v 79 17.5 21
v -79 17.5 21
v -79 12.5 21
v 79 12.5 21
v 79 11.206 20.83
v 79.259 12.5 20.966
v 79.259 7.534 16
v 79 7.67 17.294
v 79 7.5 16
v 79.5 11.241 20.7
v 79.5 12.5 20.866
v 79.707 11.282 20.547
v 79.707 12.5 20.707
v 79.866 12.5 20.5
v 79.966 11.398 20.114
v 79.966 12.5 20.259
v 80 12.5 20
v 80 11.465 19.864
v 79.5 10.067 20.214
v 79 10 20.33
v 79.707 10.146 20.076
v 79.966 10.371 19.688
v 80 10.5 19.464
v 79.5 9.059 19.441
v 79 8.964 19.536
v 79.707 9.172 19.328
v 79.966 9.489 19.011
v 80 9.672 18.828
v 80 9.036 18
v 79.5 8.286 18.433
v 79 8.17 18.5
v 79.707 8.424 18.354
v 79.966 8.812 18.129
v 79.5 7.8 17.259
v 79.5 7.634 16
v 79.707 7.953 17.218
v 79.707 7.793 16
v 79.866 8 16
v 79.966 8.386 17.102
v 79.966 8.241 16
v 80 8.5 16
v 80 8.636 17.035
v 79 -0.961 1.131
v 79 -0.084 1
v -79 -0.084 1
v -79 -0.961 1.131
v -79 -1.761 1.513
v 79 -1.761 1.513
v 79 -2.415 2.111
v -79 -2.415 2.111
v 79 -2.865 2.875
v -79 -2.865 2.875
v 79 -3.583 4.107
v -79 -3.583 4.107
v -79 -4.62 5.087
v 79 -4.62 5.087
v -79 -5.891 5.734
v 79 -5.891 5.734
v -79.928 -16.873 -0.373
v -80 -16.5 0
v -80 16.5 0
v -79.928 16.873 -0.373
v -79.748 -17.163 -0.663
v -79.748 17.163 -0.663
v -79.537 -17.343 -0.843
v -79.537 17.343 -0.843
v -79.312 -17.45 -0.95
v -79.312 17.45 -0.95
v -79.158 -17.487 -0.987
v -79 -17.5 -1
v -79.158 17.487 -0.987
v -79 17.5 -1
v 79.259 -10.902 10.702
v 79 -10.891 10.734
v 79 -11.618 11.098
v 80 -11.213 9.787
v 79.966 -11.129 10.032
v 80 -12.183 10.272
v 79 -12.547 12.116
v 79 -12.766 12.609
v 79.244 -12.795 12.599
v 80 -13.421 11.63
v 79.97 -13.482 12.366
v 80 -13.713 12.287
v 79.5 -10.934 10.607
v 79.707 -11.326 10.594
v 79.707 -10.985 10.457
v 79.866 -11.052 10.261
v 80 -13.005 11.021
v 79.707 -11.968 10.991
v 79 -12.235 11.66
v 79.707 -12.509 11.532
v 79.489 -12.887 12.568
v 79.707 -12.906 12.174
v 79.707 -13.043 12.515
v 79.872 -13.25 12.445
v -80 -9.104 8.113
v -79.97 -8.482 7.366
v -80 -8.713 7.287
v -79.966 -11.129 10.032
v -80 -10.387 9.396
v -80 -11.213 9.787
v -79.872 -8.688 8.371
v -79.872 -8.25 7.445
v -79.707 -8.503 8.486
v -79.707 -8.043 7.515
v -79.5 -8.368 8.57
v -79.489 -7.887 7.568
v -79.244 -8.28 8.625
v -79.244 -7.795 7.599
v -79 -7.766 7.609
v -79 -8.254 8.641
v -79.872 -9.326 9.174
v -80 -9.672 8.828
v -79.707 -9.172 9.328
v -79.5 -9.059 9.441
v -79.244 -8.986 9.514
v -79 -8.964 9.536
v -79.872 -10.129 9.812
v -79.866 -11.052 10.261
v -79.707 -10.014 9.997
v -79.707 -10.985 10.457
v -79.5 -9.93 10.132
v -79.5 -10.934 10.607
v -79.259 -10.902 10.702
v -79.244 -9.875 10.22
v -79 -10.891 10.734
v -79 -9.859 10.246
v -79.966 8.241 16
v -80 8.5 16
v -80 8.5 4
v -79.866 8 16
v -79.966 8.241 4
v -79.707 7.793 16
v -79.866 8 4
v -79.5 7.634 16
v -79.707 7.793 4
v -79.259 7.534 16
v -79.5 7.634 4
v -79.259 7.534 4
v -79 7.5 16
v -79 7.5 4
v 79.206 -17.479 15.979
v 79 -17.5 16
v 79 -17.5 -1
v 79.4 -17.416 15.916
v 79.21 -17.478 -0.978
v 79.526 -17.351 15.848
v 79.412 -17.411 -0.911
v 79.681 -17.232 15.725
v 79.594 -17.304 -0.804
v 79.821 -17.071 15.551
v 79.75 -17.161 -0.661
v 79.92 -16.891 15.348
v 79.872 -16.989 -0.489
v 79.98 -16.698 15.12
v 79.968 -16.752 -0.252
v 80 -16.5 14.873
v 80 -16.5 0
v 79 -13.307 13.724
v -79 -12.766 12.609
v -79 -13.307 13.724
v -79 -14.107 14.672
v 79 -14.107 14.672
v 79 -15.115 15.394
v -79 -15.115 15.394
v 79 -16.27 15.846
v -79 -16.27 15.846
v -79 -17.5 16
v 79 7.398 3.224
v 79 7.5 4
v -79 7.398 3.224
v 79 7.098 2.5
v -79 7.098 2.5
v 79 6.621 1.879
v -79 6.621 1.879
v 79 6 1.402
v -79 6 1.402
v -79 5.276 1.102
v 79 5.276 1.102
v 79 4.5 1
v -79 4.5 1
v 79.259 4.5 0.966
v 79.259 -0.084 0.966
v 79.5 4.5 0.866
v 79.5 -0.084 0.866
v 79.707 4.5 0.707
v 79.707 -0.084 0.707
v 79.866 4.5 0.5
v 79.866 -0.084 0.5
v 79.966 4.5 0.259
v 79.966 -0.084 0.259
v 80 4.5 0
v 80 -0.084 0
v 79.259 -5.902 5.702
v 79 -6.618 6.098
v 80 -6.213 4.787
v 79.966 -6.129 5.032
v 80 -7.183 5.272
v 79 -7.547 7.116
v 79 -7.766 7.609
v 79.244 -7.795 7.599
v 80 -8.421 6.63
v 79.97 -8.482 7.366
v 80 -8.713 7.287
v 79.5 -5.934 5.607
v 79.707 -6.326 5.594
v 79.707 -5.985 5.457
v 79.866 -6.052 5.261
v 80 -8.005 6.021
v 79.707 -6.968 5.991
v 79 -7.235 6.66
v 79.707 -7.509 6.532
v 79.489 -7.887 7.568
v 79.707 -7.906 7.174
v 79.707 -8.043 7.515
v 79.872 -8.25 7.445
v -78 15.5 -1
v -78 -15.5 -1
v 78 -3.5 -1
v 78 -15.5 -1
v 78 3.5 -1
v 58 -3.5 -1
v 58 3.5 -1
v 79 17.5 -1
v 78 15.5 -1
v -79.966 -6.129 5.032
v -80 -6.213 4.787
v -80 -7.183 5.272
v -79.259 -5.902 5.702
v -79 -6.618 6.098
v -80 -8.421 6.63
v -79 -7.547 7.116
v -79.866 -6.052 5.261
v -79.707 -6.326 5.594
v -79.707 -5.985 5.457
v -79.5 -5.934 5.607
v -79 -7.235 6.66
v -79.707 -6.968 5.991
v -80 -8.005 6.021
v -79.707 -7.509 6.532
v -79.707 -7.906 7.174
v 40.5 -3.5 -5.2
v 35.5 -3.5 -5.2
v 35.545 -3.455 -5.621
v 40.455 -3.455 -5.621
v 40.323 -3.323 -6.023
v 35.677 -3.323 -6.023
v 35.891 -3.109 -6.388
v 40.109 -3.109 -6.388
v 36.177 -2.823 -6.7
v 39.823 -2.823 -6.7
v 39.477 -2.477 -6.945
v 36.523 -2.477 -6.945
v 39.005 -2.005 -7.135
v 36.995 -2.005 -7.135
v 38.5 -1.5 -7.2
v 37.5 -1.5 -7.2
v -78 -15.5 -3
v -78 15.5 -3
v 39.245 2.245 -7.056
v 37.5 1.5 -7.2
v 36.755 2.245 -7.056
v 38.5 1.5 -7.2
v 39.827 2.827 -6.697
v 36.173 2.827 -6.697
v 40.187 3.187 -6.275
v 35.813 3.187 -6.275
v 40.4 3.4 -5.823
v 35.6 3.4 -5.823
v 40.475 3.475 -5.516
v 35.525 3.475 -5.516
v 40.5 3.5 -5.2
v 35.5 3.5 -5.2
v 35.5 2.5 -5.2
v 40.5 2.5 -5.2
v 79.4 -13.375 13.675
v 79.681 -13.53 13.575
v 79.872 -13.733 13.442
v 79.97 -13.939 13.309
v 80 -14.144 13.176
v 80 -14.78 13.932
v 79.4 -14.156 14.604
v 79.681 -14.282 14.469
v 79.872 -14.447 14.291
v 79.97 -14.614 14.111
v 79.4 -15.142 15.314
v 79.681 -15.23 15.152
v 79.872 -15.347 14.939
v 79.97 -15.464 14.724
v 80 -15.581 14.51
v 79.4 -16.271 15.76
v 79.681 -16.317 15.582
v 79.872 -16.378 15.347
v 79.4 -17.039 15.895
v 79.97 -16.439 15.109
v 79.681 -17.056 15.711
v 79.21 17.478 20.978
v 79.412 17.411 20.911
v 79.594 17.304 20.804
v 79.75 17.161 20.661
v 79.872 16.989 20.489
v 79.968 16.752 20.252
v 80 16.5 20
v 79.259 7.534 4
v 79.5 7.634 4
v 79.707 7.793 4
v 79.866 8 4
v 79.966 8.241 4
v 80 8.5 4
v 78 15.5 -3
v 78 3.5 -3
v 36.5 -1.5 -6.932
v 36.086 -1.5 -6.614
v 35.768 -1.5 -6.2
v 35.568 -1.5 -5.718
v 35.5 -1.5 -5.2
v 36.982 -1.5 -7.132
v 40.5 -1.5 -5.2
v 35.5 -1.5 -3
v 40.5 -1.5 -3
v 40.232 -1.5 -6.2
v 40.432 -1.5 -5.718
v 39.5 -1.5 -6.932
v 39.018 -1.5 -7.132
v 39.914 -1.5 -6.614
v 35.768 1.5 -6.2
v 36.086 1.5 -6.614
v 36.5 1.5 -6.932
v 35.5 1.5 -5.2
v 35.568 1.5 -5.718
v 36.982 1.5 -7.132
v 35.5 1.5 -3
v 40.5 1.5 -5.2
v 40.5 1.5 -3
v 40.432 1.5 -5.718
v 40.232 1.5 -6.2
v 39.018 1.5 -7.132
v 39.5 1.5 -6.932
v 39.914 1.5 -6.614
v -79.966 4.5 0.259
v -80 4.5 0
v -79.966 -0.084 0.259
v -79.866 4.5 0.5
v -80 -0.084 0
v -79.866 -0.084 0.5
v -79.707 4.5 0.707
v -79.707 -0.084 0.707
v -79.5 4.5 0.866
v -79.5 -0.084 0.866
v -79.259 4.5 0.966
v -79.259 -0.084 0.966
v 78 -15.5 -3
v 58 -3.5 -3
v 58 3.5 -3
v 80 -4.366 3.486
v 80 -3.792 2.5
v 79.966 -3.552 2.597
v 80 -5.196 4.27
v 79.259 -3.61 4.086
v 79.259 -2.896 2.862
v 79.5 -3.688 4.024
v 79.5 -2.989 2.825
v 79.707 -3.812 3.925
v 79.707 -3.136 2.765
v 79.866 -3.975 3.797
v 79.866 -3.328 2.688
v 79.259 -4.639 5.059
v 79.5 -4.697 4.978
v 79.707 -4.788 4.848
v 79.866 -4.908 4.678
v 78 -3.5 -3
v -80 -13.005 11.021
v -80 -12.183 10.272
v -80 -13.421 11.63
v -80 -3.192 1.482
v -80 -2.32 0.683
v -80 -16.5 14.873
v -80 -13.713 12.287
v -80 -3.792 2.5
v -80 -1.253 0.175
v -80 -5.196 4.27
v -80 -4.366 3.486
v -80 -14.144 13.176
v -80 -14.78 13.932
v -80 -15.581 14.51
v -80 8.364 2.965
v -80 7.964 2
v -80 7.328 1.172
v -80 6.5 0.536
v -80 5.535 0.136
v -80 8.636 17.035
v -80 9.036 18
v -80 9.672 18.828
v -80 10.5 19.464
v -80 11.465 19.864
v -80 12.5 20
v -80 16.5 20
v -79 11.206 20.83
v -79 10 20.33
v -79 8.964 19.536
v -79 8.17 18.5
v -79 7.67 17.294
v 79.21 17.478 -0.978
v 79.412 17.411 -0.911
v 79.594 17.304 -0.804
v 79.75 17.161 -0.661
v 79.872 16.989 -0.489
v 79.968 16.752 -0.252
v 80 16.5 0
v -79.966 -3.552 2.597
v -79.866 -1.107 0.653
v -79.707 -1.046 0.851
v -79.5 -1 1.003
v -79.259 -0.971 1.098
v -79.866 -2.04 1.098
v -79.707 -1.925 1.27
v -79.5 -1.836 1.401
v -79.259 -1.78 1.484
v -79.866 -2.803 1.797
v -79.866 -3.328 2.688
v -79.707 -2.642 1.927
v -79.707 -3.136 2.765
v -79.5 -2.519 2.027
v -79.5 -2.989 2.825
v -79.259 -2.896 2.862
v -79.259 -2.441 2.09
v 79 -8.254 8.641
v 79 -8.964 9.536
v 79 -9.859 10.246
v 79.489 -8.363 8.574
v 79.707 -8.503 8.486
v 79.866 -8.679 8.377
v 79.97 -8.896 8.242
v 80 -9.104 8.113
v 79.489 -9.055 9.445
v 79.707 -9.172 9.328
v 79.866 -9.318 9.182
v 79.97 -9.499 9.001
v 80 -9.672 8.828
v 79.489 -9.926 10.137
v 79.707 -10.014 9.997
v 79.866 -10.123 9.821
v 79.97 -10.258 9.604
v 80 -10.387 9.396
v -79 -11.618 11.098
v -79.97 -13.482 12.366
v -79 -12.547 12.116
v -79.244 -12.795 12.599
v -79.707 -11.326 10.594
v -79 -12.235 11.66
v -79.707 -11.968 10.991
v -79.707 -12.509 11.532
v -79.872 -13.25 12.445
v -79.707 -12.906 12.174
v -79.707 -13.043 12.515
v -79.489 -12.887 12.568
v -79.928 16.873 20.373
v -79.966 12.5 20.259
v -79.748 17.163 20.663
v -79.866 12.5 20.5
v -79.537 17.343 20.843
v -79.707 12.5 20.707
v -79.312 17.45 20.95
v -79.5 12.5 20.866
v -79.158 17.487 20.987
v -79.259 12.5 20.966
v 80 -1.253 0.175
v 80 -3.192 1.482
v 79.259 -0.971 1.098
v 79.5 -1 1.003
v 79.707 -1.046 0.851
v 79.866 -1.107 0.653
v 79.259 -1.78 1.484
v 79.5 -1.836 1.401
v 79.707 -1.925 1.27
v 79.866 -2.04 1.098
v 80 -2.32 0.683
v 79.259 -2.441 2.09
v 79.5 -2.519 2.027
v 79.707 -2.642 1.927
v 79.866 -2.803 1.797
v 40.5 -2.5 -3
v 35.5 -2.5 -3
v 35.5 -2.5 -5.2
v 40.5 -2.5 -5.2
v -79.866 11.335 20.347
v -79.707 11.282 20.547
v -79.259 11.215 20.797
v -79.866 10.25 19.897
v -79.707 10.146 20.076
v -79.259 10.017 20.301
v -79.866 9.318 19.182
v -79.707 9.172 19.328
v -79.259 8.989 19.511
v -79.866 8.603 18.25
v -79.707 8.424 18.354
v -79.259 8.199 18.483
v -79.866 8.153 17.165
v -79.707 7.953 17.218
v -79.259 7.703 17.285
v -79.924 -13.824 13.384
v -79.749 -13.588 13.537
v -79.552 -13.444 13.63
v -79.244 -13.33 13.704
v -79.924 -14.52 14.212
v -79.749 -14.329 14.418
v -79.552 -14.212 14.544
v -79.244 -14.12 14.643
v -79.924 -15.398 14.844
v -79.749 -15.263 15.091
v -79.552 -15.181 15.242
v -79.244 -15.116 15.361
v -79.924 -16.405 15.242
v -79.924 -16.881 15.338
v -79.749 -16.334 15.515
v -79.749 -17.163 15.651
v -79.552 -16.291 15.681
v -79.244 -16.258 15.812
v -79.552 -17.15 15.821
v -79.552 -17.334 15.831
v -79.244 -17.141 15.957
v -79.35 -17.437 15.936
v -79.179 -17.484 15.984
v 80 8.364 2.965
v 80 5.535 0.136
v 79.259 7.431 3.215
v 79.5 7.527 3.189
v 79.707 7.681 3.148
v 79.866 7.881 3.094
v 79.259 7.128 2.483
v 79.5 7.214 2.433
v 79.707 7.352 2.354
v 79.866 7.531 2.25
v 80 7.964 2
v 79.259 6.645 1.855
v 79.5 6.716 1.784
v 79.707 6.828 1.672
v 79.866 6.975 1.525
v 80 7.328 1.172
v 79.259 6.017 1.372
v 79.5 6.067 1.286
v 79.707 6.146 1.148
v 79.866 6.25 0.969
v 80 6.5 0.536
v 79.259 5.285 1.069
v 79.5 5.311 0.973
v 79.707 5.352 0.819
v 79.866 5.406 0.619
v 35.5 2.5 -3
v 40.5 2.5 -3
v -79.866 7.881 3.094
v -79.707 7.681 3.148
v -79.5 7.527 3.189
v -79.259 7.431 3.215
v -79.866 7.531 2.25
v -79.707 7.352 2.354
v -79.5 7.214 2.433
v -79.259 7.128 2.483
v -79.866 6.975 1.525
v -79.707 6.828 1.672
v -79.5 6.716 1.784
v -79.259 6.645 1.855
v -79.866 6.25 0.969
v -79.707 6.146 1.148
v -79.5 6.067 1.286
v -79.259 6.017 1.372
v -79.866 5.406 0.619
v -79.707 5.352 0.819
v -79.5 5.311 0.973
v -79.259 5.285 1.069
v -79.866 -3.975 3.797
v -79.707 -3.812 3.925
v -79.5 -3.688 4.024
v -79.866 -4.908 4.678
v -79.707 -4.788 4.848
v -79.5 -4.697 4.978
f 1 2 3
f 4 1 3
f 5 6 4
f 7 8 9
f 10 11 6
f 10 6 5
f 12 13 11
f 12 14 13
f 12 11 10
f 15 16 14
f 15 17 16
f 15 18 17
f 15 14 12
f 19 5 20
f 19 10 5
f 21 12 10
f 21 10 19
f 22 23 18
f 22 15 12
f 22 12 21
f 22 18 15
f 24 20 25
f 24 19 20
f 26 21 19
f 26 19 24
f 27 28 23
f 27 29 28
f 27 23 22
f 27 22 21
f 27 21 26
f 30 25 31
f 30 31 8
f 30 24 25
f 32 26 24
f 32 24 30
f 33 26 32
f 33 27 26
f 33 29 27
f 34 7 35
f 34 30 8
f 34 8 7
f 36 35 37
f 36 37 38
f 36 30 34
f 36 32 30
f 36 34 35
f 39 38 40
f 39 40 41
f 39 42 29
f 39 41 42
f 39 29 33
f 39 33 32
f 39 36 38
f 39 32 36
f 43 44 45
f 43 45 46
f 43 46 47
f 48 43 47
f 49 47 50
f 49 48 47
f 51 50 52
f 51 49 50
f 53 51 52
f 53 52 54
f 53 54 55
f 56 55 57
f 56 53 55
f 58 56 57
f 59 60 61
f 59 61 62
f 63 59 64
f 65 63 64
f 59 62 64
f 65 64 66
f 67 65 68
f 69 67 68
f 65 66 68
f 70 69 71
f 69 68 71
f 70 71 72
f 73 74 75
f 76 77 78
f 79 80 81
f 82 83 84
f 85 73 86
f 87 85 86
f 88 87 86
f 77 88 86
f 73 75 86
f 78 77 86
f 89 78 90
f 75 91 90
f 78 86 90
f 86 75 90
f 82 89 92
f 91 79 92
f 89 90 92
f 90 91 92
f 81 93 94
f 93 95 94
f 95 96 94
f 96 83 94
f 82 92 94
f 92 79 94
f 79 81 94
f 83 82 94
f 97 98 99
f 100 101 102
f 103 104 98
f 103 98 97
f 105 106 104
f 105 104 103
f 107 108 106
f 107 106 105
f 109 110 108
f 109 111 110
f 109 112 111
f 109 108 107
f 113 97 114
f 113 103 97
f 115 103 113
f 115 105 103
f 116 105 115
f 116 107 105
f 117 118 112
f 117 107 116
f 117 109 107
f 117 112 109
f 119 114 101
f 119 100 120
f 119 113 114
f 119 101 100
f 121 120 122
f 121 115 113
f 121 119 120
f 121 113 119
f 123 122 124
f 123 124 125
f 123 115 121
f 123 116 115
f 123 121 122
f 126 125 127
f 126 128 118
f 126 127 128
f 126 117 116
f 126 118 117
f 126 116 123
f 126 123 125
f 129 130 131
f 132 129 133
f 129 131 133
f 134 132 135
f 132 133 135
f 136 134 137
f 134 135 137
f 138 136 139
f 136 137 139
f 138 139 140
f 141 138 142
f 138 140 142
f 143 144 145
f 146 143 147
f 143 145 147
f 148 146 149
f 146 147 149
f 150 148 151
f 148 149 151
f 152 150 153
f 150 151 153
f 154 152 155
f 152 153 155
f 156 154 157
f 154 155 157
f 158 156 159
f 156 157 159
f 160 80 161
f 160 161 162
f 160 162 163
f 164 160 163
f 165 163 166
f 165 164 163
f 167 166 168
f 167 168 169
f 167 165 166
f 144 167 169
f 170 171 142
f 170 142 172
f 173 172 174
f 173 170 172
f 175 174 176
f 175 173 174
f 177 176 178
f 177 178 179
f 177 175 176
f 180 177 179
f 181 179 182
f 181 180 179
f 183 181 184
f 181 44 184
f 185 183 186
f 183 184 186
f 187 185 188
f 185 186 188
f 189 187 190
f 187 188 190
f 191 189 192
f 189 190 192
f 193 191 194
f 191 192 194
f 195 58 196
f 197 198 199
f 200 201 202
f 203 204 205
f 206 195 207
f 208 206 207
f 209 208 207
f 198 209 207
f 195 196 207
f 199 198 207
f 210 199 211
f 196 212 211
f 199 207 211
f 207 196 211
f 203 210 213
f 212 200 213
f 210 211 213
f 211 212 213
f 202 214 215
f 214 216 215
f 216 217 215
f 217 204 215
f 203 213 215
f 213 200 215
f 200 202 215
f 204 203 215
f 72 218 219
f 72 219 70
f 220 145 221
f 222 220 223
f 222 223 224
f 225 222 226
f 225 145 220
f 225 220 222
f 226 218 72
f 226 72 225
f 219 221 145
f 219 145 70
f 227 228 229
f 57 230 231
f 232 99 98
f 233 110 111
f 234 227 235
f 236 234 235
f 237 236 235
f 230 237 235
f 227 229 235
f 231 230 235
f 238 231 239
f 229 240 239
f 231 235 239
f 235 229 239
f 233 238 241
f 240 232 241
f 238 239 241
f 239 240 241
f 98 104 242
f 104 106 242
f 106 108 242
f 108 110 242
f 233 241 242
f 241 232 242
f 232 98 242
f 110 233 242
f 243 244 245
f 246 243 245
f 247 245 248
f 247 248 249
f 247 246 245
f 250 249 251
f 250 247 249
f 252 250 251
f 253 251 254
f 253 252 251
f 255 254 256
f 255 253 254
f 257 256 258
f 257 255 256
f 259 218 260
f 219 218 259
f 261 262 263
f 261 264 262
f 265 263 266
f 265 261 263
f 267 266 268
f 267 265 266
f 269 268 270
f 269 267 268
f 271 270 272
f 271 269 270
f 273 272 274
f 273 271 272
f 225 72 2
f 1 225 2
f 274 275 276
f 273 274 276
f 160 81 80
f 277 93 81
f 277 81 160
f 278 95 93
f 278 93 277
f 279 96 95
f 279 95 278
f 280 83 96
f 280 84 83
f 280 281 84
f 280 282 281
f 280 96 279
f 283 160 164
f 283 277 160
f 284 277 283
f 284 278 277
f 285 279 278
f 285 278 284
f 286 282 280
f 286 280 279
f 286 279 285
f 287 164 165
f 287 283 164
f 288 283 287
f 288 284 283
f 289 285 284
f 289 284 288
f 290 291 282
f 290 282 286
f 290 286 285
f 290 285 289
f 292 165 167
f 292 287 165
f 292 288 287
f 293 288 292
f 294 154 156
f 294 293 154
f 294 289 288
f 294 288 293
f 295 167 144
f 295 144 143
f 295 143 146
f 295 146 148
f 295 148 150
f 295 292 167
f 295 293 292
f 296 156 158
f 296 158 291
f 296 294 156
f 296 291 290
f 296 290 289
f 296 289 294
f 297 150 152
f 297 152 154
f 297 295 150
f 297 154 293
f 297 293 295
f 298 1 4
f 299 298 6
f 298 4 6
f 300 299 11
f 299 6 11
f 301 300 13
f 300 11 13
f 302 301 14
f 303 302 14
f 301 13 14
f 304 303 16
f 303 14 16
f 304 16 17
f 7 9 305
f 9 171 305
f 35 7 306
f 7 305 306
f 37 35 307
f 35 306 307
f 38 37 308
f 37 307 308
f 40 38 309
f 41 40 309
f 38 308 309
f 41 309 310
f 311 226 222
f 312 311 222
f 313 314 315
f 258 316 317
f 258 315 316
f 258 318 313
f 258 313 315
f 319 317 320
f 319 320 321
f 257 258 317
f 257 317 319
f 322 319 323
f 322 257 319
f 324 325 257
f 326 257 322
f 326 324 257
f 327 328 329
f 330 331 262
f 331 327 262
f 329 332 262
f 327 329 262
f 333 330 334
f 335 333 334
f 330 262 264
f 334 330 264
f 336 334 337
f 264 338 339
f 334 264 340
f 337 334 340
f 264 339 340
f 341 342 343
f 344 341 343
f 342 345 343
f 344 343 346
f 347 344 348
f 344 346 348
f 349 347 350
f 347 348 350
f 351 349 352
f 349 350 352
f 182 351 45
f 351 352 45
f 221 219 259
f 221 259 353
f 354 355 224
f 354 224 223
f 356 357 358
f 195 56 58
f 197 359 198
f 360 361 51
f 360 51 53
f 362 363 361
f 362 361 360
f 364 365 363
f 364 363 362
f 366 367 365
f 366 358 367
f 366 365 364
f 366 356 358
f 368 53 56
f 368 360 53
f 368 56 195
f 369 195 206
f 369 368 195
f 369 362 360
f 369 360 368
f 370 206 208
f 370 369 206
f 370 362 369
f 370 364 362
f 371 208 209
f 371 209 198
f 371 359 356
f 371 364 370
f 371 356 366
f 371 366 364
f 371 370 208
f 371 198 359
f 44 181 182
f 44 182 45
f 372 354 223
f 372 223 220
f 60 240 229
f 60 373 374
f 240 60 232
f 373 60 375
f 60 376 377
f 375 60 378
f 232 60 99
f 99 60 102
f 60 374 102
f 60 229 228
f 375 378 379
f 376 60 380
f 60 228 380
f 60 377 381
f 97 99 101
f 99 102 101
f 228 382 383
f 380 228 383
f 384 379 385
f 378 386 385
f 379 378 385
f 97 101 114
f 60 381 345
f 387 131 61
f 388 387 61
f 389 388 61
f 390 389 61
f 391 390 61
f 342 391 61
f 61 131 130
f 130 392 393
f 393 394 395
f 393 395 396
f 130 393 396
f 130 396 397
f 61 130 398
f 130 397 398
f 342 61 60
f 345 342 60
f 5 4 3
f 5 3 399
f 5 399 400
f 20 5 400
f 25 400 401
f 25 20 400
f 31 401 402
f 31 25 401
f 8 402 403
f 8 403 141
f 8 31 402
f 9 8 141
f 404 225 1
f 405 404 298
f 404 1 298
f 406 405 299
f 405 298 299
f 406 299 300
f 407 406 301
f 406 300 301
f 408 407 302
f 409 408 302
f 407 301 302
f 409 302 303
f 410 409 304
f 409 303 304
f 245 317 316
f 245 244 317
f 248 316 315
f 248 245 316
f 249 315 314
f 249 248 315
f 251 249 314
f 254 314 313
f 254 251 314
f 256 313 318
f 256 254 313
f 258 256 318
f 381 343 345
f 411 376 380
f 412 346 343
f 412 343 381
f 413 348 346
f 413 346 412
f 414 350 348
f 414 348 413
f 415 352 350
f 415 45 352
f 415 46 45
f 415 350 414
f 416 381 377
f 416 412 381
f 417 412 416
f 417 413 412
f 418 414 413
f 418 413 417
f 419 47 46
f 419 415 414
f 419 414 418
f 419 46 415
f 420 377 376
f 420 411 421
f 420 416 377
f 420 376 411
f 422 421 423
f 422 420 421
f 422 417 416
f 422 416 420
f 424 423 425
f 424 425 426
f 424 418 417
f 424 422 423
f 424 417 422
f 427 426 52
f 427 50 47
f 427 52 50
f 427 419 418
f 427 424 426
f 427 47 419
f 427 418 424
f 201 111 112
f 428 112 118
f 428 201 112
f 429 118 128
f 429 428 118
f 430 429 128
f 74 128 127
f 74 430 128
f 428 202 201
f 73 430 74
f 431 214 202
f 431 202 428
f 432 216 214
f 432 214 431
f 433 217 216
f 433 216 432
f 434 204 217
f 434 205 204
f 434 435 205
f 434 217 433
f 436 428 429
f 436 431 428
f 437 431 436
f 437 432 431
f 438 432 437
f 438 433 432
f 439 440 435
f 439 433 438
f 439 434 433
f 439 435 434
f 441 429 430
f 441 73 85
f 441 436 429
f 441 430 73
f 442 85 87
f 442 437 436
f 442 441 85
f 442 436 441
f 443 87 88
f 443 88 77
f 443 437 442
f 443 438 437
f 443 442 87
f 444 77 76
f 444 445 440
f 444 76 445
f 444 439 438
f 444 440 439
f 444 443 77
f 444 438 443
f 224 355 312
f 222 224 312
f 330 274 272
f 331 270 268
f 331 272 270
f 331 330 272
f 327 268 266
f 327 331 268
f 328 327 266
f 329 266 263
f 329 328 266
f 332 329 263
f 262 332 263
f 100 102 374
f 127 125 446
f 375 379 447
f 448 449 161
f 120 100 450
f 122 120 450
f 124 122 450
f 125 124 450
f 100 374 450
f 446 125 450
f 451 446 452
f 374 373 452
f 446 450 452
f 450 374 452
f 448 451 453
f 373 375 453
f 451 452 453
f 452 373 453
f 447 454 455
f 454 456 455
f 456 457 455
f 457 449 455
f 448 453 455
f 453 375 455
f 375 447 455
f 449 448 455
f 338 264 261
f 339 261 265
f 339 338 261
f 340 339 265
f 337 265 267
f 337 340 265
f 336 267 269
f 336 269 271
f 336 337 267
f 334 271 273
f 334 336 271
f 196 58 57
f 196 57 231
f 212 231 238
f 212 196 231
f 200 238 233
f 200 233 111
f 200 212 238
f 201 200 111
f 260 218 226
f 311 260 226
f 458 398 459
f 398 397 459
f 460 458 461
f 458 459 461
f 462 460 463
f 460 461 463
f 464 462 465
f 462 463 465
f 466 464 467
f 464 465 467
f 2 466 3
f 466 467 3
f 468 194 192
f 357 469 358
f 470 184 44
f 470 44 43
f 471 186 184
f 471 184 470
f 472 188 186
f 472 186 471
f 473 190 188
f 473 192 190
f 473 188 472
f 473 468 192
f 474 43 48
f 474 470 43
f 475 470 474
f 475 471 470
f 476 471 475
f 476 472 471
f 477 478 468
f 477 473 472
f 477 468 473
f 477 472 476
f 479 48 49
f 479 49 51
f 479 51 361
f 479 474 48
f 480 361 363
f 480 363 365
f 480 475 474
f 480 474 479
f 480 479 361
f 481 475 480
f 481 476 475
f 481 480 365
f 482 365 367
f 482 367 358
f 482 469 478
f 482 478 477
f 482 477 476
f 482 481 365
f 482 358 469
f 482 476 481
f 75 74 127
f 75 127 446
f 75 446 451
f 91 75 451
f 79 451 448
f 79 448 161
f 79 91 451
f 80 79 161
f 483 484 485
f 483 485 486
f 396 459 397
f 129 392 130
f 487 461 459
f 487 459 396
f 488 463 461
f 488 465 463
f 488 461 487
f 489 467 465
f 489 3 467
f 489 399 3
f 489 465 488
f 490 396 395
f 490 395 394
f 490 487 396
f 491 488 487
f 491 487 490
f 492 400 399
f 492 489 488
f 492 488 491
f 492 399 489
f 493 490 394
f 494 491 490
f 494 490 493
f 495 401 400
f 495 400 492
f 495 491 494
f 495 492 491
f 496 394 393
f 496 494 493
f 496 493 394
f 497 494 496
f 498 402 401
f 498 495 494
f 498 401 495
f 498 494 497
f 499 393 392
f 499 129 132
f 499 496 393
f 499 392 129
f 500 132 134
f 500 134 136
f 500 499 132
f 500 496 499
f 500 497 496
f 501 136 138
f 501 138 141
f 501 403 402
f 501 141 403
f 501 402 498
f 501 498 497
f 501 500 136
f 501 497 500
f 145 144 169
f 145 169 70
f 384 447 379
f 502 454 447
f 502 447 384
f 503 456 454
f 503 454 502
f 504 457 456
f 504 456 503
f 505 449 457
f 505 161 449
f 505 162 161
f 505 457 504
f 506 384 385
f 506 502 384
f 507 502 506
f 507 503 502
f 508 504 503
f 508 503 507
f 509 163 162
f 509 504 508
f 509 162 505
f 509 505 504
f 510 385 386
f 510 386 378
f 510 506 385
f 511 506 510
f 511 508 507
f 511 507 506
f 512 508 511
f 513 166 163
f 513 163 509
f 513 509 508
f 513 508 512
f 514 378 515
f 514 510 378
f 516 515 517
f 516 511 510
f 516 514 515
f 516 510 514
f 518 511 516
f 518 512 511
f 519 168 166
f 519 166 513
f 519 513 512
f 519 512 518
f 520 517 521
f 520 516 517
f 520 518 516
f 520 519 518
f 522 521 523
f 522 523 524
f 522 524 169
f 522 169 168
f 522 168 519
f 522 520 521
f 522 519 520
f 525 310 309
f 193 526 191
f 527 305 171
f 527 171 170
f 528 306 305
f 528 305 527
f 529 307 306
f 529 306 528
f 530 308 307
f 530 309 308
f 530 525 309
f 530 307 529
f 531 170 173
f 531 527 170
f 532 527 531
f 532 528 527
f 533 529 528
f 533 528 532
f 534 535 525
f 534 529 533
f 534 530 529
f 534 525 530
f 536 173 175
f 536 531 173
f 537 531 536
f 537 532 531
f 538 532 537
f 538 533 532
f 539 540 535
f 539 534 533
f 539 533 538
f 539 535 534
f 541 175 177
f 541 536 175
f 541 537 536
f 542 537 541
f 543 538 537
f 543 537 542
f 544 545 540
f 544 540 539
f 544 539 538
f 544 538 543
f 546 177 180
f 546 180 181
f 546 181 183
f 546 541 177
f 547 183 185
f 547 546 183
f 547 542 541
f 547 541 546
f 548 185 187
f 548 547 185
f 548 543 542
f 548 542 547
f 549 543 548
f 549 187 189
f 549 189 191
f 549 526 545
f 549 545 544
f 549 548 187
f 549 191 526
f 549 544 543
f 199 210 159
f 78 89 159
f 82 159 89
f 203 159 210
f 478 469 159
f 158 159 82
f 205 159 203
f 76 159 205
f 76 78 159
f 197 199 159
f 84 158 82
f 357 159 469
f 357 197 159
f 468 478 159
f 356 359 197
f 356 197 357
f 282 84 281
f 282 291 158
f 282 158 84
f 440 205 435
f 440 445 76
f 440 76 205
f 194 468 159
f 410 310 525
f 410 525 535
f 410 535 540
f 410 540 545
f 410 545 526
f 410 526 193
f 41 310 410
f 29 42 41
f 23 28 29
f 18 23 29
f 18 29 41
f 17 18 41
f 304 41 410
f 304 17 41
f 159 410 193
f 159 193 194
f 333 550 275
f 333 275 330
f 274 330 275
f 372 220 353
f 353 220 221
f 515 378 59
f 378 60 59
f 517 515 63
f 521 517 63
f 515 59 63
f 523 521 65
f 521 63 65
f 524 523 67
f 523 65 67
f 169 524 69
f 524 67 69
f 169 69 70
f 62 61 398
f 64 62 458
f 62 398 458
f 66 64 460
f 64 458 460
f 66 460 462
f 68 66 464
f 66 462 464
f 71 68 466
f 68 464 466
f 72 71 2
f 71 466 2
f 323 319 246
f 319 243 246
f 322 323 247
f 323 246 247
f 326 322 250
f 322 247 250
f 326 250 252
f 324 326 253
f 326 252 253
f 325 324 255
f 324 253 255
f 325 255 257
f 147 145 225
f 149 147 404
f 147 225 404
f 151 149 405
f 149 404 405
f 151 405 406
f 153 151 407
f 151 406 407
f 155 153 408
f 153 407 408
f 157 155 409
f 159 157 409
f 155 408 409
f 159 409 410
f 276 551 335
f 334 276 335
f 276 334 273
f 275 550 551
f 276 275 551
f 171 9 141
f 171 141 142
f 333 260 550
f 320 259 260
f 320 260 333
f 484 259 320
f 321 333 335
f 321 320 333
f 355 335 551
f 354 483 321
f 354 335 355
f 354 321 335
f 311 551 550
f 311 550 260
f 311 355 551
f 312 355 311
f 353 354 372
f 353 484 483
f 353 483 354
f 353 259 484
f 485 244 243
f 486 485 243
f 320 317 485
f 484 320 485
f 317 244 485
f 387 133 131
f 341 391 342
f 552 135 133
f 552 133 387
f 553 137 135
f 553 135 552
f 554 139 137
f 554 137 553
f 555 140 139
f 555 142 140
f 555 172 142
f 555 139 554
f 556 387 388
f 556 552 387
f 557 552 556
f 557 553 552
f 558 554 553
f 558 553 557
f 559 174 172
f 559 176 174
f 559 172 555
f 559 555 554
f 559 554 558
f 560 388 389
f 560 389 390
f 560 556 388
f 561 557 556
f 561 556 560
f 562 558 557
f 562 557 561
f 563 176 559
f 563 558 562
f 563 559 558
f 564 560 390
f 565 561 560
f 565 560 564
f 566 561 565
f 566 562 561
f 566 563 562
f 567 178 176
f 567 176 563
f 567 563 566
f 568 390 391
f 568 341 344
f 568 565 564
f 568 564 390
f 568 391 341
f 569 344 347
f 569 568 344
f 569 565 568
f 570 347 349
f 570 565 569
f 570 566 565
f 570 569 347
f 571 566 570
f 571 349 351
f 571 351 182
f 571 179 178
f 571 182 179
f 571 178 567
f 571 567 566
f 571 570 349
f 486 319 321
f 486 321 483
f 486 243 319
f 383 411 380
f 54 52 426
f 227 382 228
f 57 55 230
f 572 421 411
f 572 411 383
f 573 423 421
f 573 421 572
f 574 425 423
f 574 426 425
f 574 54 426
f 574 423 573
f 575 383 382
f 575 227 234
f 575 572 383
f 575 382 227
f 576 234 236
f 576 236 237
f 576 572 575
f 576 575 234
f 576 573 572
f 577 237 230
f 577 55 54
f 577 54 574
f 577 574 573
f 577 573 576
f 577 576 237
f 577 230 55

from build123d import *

# Parameters (mm, degrees)
F1_DEPTH  = 80
F2_W      = 156
F2_H      = 31
F3_DEPTH  = 2
F4_W      = 5
F4_H      = 5
F5_DEPTH  = 2.2
F6_W      = 5
F6_H      = 7
F7_DEPTH  = 2
F8_W      = 5
F8_H      = 3
F9_DEPTH  = 4.2
F10_R     = 1.99999
F11_W     = 20
F11_H     = 7
F12_DEPTH = 2
F13_R     = 3
F14_R     = 0.99999


# Not quite as in the source:
# - a fillet or chamfer is up to 0.001 mm smaller than in the source, because OpenCascade refuses the exact size


with BuildPart() as f1:
    # F0 (on Right) → F1 (new body, symmetric)
    with BuildSketch(Plane.YZ):
        with BuildLine():
            Line((7.5, 1), (17.5, 1))
            Line((17.5, 1), (17.5, 21))
            Line((17.5, 21), (12.5, 21))
            ThreePointArc((12.5, 21), (8.9644660941, 19.5355339059), (7.5, 16))
            Line((7.5, 16), (7.5, 1))
        make_face()
        Polygon((17.5, -1), (17.5, 1), (7.5, 1), (-2.5, 1), (-7.5, 1), (-12.5, 1), (-17.5, 1), (-17.5, -1), align=None)
        with BuildLine():
            Line((-17.5, 16), (-17.5, 1))
            Line((-17.5, 1), (-12.5, 1))
            Line((-12.5, 1), (-12.5, 11))
            ThreePointArc((-12.5, 11), (-13.9644660941, 14.5355339059), (-17.5, 16))
        make_face()
        with BuildLine():
            Line((-12.5, 1), (-7.5, 1))
            Line((-7.5, 1), (-7.5, 6))
            ThreePointArc((-7.5, 6), (-8.9644660941, 9.5355339059), (-12.5, 11))
            Line((-12.5, 11), (-12.5, 1))
        make_face()
        with BuildLine():
            Line((-7.5, 1), (-2.5, 1))
            ThreePointArc((-2.5, 1), (-3.9644660941, 4.5355339059), (-7.5, 6))
            Line((-7.5, 6), (-7.5, 1))
        make_face()
    extrude(amount=F1_DEPTH, both=True)

    # F2 (on face) → F3 (join)
    with BuildSketch(Plane(origin=(0, 0, -1), x_dir=(1, 0, 0), z_dir=(0, 0, -1))):
        Rectangle(F2_W, F2_H)
    extrude(amount=F3_DEPTH)

    # F4 (on face) → F5 (join)
    with BuildSketch(Plane(origin=(0, 0, -3), x_dir=(1, 0, 0), z_dir=(0, 0, -1))):
        with Locations((38, 0)):
            Rectangle(F4_W, F4_H)
    extrude(amount=F5_DEPTH)

    # F6 (on face) → F7 (join)
    with BuildSketch(Plane(origin=(0, 0, -5.2), x_dir=(1, 0, 0), z_dir=(0, 0, -1))):
        with Locations((38, 0)):
            Rectangle(F6_W, F6_H)
    extrude(amount=F7_DEPTH)

    # F8 (on face) → F9 (cut)
    with BuildSketch(Plane(origin=(0, 0, -7.2), x_dir=(1, 0, 0), z_dir=(0, 0, -1))):
        with Locations((38, 0)):
            Rectangle(F8_W, F8_H)
    extrude(amount=-F9_DEPTH, mode=Mode.SUBTRACT)

    # F10 (radius 2 in the source; OpenCascade refuses exactly that, so slightly less here)
    f10_edges = [f1.edges().sort_by_distance(p)[0] for p in [
        (40.5, 2.5, -7.2),
        (38, 3.5, -7.2),
        (40.5, -2.5, -7.2),
        (38, -3.5, -7.2),
        (35.5, -2.5, -7.2),
        (35.5, 2.5, -7.2),
    ]]
    fillet(f10_edges, radius=F10_R)

    # F11 (on face) → F12 (cut)
    with BuildSketch(Plane(origin=(0, 0, -3), x_dir=(1, 0, 0), z_dir=(0, 0, -1))):
        with Locations((68, 0)):
            Rectangle(F11_W, F11_H)
    extrude(amount=-F12_DEPTH, mode=Mode.SUBTRACT)

    # F13
    f13_edges = [f1.edges().sort_by_distance(p)[0] for p in [
        (0, -12.5, 11),
        (0, -7.5, 6),
        (0, -2.5, 1),
        (0, 7.5, 1),
    ]]
    fillet(f13_edges, radius=F13_R)

    # F14 (radius 1 in the source; OpenCascade refuses exactly that, so slightly less here)
    f14_edges = [f1.edges().sort_by_distance(p)[0] for p in [
        (80, 7.5, 10),
        (80, 6.62132, 1.87868),
        (80, 8.964466, 19.535534),
        (80, 2.208099, 1),
        (80, 15, 21),
        (80, -1.760852, 1.512531),
        (80, 17.5, 10),
        (80, -4.066216, 4.634436),
        (80, 0, -1),
        (80, -7.046875, 6.453125),
        (80, -17.5, 7.5),
        (80, -8.964466, 9.535534),
        (80, -14.588398, 15.064797),
        (80, -12.046875, 11.453125),
        (-80, 7.5, 10),
        (-80, 6.62132, 1.87868),
        (-80, 8.964466, 19.535534),
        (-80, 2.208099, 1),
        (-80, 15, 21),
        (-80, -1.760852, 1.512531),
        (-80, 17.5, 10),
        (-80, -4.066216, 4.634436),
        (-80, 0, -1),
        (-80, -7.046875, 6.453125),
        (-80, -17.5, 7.5),
        (-80, -8.964466, 9.535534),
        (-80, -14.588398, 15.064797),
        (-80, -12.046875, 11.453125),
    ]]
    fillet(f14_edges, radius=F14_R)


solid = f1.part
